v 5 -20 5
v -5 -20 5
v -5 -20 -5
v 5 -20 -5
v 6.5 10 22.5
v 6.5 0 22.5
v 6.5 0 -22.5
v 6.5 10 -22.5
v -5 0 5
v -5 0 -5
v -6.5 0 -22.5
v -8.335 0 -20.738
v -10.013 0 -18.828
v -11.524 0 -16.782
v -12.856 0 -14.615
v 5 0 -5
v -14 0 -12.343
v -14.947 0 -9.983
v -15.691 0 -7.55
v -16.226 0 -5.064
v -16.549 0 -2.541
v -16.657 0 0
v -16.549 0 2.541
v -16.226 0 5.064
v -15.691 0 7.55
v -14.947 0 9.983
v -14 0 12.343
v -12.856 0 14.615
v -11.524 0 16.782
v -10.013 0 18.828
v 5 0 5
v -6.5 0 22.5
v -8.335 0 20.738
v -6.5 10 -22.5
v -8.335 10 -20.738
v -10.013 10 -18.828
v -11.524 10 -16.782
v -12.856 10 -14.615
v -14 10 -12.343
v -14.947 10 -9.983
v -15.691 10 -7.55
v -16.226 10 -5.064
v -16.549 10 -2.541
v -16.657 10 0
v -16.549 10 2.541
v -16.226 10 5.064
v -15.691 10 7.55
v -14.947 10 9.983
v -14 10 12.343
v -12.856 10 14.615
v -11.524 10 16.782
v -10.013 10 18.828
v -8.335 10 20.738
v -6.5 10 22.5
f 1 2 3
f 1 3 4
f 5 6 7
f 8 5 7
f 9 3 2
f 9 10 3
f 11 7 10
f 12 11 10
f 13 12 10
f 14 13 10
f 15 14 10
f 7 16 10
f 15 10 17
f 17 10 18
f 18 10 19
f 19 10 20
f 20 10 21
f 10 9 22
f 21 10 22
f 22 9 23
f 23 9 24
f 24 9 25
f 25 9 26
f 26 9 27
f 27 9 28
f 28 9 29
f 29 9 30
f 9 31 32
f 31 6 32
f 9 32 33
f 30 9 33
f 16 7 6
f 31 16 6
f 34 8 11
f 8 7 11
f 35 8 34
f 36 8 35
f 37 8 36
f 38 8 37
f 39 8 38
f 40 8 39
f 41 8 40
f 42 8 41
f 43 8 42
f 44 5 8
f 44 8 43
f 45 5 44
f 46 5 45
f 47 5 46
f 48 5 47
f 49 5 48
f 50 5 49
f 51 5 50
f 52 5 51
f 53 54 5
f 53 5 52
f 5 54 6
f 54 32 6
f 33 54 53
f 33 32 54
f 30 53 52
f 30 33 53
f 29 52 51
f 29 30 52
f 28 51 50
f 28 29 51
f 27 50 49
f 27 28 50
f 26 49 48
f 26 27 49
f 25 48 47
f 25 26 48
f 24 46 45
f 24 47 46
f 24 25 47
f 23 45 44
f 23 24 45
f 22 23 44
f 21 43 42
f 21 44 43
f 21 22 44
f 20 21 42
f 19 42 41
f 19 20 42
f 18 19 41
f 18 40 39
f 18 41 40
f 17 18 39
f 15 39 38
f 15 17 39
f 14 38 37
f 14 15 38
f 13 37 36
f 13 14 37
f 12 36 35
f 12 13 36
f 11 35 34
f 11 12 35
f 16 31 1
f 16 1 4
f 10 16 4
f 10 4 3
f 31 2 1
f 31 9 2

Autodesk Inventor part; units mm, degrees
ref_plane "YZ Plane" through (0, 0, 0) normal (1, 0, 0) x (0, 1, 0)
ref_plane "XZ Plane" through (0, 0, 0) normal (0, 1, 0) x (-1, 0, 0)
ref_plane "XY Plane" through (0, 0, 0) normal (0, 0, 1) x (1, 0, 0)
sketch "Sketch1" plane through (0, 0, 0) normal (0, 1, 0) x (-1, 0, 0)
  line L0 (-5, 5) -> (5, 5) construction
  line L1 (5, 5) -> (5, -5) construction
  line L2 (5, -5) -> (-5, -5) construction
  line L3 (-5, -5) -> (-5, 5) construction
  line L4 (-5, 5) -> (5, -5) construction
  line L5 (5, 5) -> (-5, -5) construction
  line L6 (6.5, 22.5) -> (-6.5, 22.5)
  line L7 (-6.5, 22.5) -> (-6.5, -22.5)
  line L8 (-6.5, -22.5) -> (6.5, -22.5)
  line L9 (6.5, 22.5) -> (-6.5, -22.5) construction
  line L10 (-6.5, 22.5) -> (6.5, -22.5) construction
  arc A0 (6.5, -22.5) -> (6.5, 22.5) centre (-13.3431, 0) ccw
  point P0 (0, 0)
  dimension "d0" = 10
  dimension "d1" = 10
  dimension "d2" = 13
  dimension "d3" = 45
  dimension "d4" = 30
extrude "Extrusion1" add sketch "Sketch1" along normal blind 10
sketch "Sketch2" plane through (0, 0, 0) normal (0, -1, 0) x (1, 0, 0)
  line L0 (-5, 5) -> (5, 5)
  line L1 (5, 5) -> (5, -5)
  line L2 (5, -5) -> (-5, -5)
  line L3 (-5, -5) -> (-5, 5)
  line L4 (-5, 5) -> (5, -5) construction
  line L5 (5, 5) -> (-5, -5) construction
  point P0 (0, 0)
  dimension "d7" = 10
  dimension "d8" = 10
extrude "Extrusion2" add sketch "Sketch2" along normal blind 20
properties part number "holder"
